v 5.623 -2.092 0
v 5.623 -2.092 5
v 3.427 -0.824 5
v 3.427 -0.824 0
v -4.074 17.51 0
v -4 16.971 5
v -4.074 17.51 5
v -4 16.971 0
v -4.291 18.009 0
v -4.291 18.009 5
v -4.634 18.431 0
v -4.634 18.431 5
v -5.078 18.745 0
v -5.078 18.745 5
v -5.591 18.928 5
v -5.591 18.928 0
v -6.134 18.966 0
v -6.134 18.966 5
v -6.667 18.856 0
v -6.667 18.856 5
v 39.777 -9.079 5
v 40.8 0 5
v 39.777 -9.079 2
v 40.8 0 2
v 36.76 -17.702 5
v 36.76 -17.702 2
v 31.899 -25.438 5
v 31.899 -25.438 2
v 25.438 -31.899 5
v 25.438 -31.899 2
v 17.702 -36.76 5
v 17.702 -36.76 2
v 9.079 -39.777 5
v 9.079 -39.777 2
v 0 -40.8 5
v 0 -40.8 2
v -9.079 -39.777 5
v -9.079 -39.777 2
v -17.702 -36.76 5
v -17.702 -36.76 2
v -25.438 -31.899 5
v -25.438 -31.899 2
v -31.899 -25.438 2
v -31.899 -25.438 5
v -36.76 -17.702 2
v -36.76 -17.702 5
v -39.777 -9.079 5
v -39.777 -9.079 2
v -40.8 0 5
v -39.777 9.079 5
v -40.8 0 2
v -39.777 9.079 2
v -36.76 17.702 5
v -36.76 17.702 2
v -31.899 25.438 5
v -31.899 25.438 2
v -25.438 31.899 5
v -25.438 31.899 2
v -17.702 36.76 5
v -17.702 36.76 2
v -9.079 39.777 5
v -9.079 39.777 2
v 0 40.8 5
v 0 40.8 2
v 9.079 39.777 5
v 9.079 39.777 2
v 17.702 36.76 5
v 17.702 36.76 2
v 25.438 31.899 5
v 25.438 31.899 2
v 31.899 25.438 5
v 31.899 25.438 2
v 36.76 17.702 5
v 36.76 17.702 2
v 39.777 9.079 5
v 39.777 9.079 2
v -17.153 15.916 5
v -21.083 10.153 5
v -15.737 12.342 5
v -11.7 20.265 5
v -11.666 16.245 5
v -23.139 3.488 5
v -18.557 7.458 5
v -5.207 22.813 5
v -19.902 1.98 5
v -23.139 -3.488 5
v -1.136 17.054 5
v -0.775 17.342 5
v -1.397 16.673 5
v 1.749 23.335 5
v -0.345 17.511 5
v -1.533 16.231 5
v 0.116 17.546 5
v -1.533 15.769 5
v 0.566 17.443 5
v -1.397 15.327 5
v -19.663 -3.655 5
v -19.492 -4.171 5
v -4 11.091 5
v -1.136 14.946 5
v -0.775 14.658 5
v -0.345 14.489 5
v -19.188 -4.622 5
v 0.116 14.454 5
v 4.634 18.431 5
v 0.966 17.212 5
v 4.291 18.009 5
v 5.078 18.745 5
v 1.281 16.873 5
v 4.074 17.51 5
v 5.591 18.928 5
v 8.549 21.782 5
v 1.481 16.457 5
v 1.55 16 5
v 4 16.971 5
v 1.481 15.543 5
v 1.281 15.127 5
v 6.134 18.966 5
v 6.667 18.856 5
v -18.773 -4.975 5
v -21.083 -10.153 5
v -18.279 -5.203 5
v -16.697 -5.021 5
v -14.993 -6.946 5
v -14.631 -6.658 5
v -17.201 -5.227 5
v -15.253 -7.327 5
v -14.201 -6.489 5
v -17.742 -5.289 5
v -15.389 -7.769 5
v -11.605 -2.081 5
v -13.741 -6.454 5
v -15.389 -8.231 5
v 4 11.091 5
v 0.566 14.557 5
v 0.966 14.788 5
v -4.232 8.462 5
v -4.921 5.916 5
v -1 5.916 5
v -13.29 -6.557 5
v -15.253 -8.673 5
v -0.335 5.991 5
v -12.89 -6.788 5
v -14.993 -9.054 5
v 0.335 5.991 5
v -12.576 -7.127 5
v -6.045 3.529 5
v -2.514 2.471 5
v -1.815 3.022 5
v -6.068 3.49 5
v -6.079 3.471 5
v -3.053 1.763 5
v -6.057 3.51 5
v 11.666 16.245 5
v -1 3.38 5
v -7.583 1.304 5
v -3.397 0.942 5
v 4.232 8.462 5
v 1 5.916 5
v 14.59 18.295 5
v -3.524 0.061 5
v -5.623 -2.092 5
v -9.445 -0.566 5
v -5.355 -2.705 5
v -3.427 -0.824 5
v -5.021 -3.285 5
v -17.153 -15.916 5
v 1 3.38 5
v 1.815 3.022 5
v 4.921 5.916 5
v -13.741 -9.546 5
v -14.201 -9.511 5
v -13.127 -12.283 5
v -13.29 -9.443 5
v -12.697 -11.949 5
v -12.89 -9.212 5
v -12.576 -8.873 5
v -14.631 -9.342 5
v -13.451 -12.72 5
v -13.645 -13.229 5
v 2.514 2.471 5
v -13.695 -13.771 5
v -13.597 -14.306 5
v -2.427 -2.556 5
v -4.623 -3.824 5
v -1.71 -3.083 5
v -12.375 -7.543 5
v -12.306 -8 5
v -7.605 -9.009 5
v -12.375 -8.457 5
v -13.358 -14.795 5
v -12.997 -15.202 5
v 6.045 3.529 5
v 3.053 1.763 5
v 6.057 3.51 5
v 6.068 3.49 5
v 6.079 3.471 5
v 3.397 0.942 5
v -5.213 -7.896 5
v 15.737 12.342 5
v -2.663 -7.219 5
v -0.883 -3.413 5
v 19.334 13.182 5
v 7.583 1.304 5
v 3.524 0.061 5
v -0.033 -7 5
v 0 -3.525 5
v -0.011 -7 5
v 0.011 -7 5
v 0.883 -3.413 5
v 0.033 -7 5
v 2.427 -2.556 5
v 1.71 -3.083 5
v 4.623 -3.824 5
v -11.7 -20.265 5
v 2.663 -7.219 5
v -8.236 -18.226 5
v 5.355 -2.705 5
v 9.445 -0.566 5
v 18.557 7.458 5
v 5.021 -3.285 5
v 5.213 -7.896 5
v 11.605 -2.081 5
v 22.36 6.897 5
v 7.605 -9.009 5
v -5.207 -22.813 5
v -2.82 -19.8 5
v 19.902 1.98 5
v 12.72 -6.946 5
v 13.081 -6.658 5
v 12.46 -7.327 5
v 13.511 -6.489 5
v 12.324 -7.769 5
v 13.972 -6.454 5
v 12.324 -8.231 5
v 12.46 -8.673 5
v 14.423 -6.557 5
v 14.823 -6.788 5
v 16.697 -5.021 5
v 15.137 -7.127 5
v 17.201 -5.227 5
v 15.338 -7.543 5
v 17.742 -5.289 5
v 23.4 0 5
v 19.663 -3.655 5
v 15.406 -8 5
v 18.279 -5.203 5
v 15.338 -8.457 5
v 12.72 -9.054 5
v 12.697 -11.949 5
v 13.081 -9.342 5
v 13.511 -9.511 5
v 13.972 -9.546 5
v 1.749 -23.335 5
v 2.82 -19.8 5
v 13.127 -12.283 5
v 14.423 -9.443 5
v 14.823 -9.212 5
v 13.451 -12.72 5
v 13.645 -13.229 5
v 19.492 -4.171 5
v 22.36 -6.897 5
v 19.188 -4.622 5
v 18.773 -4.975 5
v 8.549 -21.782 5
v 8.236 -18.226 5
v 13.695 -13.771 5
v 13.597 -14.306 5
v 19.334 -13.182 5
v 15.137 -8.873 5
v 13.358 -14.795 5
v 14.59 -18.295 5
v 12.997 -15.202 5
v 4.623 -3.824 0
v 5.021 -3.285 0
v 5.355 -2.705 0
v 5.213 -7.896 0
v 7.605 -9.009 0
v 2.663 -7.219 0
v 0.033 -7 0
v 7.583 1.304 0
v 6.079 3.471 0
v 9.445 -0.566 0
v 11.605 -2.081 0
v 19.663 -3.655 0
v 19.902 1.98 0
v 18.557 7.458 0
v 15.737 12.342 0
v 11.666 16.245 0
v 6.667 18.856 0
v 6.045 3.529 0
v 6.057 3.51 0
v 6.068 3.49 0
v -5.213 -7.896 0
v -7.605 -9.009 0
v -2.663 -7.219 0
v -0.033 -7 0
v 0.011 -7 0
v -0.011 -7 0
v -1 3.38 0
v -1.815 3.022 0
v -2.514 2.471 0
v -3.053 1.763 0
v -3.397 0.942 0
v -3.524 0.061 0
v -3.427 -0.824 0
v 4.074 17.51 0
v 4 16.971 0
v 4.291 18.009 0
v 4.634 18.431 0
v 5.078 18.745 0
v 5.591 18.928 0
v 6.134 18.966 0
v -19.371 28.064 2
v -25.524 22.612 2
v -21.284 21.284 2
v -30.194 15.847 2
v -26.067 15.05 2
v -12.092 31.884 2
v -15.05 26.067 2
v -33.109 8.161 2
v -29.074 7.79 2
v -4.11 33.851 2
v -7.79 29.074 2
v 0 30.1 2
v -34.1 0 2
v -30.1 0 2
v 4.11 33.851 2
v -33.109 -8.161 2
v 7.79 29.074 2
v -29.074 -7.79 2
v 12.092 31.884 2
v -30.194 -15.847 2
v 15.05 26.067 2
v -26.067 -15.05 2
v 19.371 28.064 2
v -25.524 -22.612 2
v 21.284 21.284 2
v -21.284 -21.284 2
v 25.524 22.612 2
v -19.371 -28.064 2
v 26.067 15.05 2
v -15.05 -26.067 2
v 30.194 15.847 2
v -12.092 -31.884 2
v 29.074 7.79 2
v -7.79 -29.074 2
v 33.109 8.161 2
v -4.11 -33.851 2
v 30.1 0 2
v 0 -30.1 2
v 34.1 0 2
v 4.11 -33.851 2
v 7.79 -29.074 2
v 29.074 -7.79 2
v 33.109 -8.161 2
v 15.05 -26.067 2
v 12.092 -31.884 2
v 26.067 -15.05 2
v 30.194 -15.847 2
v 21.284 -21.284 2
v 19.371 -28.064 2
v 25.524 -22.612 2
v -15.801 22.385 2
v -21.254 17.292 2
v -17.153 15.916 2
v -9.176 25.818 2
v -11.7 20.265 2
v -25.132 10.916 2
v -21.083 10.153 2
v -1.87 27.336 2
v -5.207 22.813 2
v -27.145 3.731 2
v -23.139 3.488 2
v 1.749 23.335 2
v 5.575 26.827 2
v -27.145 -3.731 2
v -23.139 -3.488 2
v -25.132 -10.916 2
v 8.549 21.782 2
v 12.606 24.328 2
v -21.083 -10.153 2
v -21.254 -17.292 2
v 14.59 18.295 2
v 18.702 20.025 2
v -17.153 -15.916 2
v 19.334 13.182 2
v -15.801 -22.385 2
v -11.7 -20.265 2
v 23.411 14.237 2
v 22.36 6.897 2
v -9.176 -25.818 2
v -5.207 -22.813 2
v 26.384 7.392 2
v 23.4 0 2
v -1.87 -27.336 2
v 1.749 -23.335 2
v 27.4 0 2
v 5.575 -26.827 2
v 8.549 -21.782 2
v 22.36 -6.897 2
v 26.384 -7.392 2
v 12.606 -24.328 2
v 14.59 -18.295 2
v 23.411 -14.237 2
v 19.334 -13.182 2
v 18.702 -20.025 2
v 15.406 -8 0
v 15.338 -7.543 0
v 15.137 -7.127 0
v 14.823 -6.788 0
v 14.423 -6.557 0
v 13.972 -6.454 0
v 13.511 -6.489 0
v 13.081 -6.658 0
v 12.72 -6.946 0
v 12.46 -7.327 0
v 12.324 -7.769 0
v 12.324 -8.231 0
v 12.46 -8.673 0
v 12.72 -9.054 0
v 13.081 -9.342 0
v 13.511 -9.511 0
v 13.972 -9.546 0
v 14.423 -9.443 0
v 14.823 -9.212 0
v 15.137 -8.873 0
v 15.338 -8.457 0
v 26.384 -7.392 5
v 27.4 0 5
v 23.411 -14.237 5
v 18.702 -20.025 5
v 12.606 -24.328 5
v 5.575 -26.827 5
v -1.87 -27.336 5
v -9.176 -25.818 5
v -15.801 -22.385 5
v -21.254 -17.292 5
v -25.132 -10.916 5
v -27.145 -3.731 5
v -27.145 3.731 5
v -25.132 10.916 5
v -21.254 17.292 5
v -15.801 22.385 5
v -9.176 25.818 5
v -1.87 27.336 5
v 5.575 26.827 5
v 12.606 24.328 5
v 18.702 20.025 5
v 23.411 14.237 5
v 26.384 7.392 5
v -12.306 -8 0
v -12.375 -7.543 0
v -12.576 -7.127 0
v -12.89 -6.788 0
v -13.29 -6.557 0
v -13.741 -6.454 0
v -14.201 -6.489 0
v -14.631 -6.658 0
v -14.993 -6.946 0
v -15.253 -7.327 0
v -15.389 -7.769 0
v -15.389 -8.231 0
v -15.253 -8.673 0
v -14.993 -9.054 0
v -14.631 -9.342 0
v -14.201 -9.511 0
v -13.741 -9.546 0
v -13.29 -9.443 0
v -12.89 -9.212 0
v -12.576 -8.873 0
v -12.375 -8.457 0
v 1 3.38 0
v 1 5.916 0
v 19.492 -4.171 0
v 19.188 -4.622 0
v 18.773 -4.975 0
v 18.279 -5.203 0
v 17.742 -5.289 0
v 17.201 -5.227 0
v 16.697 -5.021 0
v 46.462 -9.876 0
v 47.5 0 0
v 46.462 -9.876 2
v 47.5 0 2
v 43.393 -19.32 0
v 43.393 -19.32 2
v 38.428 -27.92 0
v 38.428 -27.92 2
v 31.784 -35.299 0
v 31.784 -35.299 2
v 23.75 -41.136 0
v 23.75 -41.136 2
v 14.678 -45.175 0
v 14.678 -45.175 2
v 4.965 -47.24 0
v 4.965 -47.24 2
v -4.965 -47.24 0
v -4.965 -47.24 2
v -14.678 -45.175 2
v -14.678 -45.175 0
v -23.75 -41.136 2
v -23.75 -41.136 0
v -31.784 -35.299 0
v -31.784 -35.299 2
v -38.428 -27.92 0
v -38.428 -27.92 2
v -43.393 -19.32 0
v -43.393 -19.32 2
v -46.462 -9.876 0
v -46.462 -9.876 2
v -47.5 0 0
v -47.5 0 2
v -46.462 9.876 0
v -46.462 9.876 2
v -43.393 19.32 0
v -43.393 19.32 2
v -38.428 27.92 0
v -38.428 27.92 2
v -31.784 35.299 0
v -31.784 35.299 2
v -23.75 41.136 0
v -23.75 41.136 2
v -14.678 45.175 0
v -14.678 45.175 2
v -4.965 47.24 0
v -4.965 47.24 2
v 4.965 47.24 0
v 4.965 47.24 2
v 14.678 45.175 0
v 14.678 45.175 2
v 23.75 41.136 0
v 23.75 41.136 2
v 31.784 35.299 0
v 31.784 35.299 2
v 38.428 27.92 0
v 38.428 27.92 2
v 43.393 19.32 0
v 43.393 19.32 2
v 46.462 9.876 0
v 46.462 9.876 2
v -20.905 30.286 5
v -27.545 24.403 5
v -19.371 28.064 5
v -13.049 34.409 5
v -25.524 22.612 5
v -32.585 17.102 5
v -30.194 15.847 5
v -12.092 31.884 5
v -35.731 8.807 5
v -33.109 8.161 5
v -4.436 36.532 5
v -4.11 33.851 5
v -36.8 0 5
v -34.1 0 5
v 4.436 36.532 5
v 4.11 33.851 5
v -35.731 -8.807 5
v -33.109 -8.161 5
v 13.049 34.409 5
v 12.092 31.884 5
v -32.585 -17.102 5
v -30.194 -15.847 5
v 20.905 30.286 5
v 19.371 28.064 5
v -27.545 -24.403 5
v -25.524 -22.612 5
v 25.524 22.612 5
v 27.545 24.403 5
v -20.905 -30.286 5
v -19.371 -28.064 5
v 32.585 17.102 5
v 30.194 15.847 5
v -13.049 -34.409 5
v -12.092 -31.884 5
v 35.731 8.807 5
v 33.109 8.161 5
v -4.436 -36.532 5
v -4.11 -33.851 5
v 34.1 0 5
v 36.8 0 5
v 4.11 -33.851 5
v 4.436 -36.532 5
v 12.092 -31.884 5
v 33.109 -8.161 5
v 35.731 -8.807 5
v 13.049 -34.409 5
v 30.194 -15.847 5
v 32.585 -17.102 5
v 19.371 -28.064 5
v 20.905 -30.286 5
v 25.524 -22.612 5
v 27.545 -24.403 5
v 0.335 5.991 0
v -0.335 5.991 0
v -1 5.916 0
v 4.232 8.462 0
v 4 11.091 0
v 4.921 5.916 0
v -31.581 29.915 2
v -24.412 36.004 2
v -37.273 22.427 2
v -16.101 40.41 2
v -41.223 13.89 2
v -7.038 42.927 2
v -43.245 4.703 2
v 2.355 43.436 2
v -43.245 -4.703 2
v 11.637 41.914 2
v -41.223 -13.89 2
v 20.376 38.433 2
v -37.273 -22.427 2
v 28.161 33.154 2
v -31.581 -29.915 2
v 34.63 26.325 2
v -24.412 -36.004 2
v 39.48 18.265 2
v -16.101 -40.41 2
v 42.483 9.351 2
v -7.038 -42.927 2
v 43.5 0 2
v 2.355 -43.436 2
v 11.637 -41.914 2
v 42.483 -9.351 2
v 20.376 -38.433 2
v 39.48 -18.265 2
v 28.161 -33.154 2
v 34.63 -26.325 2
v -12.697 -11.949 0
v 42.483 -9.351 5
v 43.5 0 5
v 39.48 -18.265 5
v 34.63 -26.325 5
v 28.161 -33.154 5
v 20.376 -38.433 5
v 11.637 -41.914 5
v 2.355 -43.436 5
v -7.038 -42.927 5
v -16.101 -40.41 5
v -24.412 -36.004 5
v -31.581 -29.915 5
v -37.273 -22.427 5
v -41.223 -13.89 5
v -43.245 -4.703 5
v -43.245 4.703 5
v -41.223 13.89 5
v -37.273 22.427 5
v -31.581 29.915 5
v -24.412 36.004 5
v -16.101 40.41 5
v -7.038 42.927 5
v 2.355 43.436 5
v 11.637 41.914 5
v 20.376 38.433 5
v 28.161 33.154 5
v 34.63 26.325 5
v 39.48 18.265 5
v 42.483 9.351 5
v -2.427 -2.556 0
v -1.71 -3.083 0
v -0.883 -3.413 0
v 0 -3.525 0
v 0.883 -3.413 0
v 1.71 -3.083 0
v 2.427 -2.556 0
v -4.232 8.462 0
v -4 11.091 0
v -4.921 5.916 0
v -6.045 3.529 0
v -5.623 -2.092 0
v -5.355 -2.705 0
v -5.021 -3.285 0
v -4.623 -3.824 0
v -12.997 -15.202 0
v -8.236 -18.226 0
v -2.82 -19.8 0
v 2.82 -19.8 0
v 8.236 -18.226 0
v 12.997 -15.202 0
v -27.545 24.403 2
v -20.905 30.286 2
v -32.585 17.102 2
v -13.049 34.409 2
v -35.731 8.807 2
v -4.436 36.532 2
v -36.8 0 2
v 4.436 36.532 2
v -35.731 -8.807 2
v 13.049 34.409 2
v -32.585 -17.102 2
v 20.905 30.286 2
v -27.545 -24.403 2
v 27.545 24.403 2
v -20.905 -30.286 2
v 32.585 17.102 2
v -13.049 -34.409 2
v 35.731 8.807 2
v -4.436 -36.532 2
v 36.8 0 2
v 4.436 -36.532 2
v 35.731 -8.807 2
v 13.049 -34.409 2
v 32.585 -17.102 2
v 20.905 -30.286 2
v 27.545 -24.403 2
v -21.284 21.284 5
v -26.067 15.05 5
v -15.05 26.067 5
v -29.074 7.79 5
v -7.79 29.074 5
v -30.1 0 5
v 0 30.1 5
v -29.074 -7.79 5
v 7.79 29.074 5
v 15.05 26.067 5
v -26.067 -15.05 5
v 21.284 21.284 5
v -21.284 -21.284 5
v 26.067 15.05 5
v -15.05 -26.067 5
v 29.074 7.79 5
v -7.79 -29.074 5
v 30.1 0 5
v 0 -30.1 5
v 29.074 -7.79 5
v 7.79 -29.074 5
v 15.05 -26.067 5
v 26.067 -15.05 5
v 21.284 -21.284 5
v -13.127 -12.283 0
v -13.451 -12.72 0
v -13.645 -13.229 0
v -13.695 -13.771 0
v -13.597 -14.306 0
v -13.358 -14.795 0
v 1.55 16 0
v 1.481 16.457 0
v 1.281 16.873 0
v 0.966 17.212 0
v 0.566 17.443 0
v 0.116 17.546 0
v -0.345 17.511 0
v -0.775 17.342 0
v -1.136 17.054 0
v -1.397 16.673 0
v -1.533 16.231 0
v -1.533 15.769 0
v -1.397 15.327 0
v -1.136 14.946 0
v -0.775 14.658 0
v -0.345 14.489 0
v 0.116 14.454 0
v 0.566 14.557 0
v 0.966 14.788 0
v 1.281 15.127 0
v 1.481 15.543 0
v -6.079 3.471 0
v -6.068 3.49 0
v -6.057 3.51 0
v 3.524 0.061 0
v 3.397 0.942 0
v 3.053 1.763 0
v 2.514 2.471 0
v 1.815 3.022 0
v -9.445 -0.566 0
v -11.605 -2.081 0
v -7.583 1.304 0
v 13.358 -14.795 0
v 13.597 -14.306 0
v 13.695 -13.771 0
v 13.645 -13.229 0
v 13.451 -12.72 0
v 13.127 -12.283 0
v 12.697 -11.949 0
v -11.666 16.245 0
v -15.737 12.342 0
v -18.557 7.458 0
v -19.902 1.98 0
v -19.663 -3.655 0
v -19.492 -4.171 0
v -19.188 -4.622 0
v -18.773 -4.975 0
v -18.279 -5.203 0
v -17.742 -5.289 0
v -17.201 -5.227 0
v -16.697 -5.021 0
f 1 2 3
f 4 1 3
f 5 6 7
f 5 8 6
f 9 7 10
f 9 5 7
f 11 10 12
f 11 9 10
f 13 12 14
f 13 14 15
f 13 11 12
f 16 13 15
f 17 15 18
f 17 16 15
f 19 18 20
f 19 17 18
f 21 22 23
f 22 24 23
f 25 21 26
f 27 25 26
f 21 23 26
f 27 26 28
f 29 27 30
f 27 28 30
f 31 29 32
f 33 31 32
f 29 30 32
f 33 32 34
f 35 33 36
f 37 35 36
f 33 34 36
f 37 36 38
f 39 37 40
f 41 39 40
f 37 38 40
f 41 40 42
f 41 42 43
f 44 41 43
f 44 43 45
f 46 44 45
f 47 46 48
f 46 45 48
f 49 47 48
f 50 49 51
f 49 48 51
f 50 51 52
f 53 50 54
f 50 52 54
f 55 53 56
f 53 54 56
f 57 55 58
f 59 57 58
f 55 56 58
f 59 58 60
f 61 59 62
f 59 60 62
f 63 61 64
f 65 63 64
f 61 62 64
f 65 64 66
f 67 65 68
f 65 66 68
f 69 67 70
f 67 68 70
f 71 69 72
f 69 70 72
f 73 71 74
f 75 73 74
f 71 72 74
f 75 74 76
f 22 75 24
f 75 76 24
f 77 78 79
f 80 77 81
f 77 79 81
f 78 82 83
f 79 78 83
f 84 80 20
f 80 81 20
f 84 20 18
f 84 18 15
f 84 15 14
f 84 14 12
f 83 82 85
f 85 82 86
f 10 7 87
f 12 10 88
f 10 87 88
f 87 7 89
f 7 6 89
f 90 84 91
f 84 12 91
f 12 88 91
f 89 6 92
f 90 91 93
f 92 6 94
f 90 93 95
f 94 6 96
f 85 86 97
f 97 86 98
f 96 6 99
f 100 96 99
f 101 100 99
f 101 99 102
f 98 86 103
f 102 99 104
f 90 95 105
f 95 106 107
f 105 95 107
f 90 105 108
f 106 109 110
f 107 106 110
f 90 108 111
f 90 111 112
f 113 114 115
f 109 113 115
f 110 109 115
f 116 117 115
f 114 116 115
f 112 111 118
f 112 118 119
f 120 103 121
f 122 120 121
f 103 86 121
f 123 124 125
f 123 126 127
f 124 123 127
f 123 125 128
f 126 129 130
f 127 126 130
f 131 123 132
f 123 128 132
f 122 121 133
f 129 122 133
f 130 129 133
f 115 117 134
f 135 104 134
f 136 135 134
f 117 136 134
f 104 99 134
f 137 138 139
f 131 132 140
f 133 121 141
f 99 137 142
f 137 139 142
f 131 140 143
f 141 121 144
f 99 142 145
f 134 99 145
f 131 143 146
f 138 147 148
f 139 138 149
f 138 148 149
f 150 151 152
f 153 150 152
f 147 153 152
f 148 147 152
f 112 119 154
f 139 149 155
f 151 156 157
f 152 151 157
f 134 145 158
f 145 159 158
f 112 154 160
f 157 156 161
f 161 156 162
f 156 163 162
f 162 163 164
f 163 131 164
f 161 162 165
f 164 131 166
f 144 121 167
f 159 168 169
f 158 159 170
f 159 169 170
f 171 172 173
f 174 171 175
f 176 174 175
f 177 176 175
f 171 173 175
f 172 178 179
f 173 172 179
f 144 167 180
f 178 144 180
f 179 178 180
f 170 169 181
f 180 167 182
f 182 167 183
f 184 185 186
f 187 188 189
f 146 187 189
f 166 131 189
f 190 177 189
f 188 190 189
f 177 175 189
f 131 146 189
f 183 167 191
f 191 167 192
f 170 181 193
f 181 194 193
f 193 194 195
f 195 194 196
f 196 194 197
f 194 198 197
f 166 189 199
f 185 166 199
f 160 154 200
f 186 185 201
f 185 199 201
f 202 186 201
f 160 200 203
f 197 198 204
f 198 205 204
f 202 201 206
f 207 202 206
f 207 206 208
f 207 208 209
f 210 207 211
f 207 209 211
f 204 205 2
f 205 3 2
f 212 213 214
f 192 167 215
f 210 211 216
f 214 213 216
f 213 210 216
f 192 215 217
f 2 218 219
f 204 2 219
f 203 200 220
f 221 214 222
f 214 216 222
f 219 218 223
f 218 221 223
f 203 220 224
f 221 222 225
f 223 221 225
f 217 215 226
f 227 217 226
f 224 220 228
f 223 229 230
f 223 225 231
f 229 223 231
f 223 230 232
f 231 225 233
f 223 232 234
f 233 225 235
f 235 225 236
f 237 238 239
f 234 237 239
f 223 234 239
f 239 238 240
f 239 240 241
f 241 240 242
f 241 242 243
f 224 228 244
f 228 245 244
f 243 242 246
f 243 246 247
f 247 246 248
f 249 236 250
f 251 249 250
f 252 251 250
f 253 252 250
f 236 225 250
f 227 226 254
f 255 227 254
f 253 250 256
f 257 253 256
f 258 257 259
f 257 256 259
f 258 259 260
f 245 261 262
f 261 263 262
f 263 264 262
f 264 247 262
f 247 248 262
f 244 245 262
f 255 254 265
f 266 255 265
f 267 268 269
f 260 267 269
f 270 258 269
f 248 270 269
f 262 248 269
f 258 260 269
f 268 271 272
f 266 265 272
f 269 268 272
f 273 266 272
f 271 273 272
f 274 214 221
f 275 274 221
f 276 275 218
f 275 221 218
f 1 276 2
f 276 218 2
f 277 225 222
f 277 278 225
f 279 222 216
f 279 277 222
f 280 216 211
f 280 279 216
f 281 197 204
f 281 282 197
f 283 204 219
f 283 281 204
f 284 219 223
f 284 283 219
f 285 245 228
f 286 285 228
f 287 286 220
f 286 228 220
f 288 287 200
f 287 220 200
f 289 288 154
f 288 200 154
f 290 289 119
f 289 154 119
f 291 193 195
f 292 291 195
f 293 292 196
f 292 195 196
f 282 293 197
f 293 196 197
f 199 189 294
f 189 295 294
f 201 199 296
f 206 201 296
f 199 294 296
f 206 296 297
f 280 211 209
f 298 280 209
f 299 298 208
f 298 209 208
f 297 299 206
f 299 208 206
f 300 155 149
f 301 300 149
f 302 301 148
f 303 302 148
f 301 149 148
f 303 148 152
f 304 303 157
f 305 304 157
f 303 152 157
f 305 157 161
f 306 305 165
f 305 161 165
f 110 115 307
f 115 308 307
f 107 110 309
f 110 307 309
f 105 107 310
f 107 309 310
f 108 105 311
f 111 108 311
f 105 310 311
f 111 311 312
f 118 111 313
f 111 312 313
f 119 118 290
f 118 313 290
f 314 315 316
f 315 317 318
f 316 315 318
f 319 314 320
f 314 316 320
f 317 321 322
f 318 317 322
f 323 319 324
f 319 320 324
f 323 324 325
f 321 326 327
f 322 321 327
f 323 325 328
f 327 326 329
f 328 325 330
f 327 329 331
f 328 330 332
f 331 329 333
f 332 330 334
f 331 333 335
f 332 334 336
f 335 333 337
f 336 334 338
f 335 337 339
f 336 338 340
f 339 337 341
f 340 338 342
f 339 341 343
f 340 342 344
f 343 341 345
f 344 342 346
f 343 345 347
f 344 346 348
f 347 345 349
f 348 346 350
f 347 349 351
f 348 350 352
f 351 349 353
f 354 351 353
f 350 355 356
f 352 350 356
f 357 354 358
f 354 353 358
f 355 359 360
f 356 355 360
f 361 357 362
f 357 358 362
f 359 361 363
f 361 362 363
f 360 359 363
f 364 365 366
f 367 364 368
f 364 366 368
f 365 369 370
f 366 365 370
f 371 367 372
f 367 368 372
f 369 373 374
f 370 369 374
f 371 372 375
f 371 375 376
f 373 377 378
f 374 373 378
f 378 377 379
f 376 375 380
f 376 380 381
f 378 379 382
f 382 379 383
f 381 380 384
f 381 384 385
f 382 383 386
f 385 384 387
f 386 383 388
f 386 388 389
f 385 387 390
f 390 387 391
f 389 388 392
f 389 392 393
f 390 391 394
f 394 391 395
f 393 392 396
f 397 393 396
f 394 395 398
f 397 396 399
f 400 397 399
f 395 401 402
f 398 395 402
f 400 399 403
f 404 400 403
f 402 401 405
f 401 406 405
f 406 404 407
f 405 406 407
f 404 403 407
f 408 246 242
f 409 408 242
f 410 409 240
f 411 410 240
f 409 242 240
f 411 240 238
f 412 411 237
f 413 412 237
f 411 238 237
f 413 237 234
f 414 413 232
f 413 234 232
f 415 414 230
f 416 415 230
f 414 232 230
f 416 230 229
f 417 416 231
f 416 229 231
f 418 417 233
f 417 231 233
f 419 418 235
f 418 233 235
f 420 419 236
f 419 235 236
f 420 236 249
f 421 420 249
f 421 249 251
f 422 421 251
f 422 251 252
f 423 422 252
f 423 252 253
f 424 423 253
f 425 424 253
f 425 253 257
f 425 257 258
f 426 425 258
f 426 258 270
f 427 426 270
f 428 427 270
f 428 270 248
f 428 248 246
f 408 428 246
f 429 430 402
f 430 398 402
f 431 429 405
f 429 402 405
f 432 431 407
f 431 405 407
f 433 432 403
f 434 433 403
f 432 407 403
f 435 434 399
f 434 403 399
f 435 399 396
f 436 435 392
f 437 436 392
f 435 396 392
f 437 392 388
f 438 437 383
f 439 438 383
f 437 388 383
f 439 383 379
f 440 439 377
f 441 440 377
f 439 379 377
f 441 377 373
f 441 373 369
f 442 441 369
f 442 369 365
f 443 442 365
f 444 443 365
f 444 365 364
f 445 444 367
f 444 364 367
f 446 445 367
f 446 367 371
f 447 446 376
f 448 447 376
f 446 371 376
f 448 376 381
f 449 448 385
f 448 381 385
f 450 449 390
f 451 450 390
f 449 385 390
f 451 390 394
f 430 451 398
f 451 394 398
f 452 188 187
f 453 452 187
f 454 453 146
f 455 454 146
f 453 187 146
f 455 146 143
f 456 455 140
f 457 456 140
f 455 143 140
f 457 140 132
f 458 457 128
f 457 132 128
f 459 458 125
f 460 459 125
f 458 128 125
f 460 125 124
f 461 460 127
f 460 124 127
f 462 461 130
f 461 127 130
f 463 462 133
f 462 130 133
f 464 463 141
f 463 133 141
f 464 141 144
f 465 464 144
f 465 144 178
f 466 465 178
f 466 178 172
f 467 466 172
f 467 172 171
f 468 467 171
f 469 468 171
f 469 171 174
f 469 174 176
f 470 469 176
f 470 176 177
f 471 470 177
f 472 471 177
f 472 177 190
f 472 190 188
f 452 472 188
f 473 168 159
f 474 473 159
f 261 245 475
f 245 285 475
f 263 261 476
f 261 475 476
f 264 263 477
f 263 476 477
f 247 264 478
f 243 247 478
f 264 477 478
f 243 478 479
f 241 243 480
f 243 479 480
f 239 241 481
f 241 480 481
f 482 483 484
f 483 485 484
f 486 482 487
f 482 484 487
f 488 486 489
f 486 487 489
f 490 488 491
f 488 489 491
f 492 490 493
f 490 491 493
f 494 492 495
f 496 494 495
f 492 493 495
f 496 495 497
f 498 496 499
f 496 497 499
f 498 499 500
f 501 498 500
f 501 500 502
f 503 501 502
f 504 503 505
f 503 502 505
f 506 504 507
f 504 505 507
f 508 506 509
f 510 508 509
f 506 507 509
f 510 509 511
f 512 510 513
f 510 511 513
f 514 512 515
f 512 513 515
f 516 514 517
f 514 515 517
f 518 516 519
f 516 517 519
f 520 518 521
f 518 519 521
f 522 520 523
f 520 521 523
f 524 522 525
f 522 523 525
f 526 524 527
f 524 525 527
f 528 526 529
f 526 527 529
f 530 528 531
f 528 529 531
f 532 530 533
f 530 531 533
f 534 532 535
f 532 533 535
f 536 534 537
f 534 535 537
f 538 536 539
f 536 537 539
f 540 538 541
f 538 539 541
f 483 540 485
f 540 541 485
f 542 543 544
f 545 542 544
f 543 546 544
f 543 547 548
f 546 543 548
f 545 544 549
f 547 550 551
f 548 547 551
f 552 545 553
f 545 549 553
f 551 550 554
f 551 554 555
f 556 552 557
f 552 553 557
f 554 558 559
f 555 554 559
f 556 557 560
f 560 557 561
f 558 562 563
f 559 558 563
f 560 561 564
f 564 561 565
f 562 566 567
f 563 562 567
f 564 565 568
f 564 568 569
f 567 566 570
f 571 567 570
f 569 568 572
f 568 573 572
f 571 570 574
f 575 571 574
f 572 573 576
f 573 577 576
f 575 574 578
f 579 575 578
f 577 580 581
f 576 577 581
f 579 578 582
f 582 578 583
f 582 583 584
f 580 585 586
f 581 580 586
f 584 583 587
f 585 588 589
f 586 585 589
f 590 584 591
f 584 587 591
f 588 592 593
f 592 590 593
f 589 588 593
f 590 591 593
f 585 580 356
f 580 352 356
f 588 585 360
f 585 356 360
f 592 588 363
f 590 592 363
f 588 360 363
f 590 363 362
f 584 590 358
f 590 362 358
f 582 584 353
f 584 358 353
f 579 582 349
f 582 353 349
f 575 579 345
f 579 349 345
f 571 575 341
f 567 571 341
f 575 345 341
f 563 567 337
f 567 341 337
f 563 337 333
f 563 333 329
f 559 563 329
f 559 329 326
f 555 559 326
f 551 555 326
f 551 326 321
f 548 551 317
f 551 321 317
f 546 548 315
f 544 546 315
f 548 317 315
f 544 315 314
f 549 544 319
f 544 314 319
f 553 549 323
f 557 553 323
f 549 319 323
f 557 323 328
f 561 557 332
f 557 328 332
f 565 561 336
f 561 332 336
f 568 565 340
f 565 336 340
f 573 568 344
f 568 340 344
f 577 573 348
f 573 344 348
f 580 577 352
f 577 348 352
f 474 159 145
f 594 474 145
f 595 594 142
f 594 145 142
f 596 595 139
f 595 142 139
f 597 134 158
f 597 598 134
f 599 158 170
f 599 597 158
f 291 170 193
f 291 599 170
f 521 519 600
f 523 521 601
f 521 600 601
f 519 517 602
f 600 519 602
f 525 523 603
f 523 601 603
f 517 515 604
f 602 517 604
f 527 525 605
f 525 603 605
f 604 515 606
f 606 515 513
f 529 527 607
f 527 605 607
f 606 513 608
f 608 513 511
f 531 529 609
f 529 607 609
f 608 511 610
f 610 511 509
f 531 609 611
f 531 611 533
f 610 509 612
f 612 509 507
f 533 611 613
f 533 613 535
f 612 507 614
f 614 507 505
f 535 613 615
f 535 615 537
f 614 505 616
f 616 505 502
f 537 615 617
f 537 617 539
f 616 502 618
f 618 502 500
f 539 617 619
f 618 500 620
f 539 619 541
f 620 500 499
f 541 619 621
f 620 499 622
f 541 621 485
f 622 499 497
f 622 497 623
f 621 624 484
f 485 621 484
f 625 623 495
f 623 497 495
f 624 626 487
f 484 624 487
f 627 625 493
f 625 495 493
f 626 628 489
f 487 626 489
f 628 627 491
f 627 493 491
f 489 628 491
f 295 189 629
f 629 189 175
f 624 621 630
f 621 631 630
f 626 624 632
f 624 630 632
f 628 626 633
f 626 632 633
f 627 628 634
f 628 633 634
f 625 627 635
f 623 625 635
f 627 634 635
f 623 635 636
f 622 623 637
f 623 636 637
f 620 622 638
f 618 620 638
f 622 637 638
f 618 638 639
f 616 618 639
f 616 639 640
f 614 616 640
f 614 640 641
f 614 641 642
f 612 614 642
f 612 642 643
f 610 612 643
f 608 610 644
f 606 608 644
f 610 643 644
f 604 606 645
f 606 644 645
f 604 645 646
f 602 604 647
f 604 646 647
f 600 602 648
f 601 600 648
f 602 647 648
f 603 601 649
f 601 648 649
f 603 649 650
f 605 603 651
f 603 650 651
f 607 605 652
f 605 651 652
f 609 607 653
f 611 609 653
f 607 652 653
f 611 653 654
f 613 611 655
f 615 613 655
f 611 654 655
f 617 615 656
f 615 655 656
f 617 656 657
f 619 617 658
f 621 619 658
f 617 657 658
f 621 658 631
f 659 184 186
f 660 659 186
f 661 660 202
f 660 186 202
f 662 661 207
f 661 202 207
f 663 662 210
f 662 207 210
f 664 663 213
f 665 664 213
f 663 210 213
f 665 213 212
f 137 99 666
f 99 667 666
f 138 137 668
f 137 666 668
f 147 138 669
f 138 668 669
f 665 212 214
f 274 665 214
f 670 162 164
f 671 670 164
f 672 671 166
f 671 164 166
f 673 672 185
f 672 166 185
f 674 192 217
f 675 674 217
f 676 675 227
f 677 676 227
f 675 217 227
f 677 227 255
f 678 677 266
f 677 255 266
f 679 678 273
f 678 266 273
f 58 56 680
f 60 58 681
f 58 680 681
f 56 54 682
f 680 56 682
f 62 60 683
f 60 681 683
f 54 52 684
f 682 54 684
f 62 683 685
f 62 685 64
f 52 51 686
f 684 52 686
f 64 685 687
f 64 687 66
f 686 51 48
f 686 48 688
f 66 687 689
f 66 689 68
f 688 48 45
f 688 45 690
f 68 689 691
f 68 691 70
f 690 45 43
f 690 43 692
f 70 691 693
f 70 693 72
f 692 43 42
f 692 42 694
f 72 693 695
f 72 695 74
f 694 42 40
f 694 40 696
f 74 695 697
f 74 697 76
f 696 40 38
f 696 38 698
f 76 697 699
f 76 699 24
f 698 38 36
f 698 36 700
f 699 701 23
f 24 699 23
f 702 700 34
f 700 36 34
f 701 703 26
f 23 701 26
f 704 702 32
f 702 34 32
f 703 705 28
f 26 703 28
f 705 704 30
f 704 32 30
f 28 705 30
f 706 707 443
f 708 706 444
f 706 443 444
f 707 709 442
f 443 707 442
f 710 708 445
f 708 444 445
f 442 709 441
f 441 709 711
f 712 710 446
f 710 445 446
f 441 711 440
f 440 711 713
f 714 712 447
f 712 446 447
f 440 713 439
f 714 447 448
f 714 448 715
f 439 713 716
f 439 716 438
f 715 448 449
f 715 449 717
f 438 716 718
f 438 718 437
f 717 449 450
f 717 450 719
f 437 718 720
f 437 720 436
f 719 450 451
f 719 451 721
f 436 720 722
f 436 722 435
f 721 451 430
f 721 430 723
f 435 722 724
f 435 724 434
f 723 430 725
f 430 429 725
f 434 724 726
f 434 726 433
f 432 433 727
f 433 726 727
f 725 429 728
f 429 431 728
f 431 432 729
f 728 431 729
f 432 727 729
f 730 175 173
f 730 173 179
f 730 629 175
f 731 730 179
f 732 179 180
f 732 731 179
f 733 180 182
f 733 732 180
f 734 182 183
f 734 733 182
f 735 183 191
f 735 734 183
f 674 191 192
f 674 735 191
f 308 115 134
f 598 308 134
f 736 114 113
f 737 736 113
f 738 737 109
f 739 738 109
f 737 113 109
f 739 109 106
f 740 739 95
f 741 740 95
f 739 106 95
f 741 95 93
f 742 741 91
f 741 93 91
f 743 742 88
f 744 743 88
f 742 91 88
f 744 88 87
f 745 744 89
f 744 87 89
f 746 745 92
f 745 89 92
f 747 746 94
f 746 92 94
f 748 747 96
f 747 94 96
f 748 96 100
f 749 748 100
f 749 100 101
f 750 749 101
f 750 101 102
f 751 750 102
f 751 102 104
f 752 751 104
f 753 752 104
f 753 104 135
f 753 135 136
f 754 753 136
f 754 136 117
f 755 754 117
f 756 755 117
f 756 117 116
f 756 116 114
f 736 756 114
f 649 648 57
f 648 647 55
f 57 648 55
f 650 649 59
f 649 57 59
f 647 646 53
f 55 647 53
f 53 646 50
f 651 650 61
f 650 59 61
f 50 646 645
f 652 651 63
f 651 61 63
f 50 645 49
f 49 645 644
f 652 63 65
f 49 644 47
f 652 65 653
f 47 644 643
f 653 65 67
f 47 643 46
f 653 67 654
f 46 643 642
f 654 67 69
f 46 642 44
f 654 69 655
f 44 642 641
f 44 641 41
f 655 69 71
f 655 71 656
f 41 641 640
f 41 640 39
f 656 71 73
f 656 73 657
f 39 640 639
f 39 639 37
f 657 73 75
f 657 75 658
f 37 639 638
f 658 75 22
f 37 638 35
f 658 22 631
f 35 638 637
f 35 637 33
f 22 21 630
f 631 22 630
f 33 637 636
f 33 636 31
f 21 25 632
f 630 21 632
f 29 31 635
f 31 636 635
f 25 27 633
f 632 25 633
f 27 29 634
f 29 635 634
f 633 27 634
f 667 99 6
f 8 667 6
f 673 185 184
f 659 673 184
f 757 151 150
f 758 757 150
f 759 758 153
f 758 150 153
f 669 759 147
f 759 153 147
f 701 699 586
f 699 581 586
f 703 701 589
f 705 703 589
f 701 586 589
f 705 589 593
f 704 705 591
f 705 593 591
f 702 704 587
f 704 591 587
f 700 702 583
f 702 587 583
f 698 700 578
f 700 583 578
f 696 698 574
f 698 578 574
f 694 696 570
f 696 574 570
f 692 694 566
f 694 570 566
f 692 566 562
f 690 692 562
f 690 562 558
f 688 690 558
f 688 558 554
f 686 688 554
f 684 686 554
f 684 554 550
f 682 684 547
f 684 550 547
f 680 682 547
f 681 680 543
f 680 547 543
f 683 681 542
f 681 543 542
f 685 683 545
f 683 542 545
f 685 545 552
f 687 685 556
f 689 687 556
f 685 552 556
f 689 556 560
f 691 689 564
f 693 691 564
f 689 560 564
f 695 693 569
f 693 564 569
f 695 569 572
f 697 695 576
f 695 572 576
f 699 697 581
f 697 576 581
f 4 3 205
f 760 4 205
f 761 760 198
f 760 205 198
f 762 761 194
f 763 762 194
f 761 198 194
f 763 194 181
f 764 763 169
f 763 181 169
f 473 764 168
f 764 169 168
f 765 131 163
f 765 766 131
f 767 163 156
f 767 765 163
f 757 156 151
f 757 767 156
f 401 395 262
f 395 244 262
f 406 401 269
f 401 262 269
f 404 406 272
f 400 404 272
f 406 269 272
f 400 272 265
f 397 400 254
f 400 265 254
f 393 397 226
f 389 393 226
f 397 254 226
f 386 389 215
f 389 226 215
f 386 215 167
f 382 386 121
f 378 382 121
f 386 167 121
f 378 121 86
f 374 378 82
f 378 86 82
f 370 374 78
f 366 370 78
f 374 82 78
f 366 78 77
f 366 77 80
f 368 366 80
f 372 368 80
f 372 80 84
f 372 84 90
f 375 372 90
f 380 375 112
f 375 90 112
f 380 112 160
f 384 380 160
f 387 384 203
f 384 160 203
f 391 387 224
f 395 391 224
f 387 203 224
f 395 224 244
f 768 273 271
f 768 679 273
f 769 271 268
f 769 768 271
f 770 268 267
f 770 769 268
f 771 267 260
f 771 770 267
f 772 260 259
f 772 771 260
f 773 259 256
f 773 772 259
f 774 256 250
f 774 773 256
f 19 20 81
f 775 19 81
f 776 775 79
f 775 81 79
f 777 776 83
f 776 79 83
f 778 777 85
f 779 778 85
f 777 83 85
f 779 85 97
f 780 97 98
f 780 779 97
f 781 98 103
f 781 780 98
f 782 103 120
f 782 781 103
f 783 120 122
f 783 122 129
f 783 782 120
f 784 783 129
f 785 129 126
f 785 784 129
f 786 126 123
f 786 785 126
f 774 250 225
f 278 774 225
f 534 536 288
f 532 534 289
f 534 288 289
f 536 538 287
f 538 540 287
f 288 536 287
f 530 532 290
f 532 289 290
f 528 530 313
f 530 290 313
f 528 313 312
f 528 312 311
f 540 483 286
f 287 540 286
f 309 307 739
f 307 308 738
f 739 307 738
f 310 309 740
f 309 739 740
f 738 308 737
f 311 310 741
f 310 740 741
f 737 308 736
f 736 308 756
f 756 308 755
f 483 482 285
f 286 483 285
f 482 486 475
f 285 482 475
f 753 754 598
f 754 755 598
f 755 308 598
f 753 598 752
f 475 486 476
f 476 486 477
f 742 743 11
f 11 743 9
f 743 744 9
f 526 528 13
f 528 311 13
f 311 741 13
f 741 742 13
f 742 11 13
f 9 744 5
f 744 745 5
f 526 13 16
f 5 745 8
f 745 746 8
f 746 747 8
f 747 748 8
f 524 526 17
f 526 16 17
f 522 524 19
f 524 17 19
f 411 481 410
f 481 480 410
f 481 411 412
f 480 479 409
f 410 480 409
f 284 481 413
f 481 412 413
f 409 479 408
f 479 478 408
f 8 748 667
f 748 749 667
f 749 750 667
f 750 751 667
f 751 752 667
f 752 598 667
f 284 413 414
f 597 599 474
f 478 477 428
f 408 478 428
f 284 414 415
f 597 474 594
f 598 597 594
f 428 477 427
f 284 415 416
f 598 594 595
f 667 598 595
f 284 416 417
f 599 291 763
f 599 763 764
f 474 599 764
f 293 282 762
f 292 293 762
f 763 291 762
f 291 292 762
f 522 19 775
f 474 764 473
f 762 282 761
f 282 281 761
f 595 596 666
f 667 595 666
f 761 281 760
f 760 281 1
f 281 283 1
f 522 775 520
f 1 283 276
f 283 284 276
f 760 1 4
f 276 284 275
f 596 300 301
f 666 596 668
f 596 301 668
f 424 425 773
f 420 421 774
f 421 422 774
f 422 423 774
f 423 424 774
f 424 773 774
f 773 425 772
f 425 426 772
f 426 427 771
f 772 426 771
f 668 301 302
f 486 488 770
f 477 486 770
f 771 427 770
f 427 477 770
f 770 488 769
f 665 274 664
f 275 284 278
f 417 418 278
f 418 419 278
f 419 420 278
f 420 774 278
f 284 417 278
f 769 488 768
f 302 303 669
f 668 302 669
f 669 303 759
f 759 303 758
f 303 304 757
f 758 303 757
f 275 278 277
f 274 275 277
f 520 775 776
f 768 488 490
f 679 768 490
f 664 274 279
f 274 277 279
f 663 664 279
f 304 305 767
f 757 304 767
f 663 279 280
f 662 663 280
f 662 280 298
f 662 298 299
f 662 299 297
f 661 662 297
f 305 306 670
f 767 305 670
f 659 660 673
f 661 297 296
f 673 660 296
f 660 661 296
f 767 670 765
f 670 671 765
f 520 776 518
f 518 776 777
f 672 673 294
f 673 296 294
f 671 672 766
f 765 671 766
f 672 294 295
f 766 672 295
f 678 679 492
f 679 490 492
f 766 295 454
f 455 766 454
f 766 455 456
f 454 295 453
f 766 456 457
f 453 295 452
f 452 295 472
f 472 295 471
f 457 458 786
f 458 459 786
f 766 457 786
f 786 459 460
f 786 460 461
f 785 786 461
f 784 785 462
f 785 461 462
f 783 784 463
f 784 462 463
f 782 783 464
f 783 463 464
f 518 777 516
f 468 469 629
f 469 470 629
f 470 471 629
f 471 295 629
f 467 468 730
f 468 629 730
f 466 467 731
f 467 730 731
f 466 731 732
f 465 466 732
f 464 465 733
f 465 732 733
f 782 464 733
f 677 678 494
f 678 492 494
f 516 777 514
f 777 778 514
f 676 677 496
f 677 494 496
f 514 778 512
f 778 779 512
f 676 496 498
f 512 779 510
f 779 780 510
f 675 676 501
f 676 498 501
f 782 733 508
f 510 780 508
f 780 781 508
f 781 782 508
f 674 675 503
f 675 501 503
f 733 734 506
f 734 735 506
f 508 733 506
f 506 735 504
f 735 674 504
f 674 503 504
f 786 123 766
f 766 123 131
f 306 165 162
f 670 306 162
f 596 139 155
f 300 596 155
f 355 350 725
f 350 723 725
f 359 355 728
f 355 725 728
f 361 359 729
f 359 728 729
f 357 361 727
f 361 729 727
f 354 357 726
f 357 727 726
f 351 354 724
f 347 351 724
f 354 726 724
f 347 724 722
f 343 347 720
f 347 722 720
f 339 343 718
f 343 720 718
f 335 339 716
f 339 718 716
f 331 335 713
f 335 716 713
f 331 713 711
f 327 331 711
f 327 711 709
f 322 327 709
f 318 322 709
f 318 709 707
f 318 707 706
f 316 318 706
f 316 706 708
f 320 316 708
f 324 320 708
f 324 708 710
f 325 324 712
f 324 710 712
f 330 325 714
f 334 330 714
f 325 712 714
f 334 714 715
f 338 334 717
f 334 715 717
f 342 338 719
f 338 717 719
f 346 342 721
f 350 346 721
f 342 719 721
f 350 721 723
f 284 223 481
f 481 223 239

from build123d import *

# Parameters (mm, degrees)
F2_R     = 1.55
F3_DEPTH = 5.001
F4_R     = 15
F5_R     = 2


with BuildPart() as f1:
    # F0 (on Front) → F1 (revolve)
    with BuildSketch(Plane.XZ):
        Polygon((0, 0), (47.5, 0), (47.5, 2), (43.5, 2), (43.5, 5), (40.8, 5), (40.8, 2), (36.8, 2), (36.8, 5), (34.1, 5), (34.1, 2), (30.1, 2), (30.1, 5), (27.4, 5), (27.4, 2), (23.4, 2), (23.4, 5), (0, 5), align=None)
    revolve(axis=Axis((0, 0, 0.333373), (0, 0, -1)))

    # F2 (on face) → F3 (cut, through all)
    with BuildSketch(Plane.XY.offset(5)):
        with BuildLine():
            ThreePointArc((3.427323, -0.824065), (3.05274, 1.7625), (1, 3.380181))
            Line((1, 3.380181), (1, 5.91608))
            ThreePointArc((1, 5.91608), (0, 6), (-1, 5.91608))
            Line((-1, 5.91608), (-1, 3.380181))
            ThreePointArc((-1, 3.380181), (-3.05274, 1.7625), (-3.427323, -0.824065))
            Line((-3.427323, -0.824065), (-5.623475, -2.092014))
            ThreePointArc((-5.623475, -2.092014), (-5.196152, -3), (-4.623475, -3.824065))
            Line((-4.623475, -3.824065), (-2.427323, -2.556116))
            ThreePointArc((-2.427323, -2.556116), (0, -3.525), (2.427323, -2.556116))
            Line((2.427323, -2.556116), (4.623475, -3.824065))
            ThreePointArc((4.623475, -3.824065), (5.196152, -3), (5.623475, -2.092014))
            Line((5.623475, -2.092014), (3.427323, -0.824065))
        make_face()
        with BuildLine():
            ThreePointArc((-6.974937, 0.59182), (-6.062178, 3.5), (-4, 5.744563))
            Line((-4, 5.744563), (-4, 19.595918))
            ThreePointArc((-4, 19.595918), (-17.320508, 10), (-18.970563, -6.333857))
            Line((-18.970563, -6.333857), (-6.974937, 0.59182))
        make_face()
        with BuildLine():
            Line((4, 19.595918), (4, 5.744563))
            ThreePointArc((4, 5.744563), (6.062178, 3.5), (6.974937, 0.59182))
            Line((6.974937, 0.59182), (18.970563, -6.333857))
            ThreePointArc((18.970563, -6.333857), (17.320508, 10), (4, 19.595918))
        make_face()
        with Locations((0, 16)):
            Circle(F2_R)
        with BuildLine():
            ThreePointArc((2.974937, -6.336383), (0, -7), (-2.974937, -6.336383))
            Line((-2.974937, -6.336383), (-14.970563, -13.262061))
            ThreePointArc((-14.970563, -13.262061), (0, -20), (14.970563, -13.262061))
            Line((14.970563, -13.262061), (2.974937, -6.336383))
        make_face()
        with Locations((-13.856406, -8)):
            Circle(F2_R)
        with Locations((13.856406, -8)):
            Circle(F2_R)
    extrude(amount=-F3_DEPTH, mode=Mode.SUBTRACT)

    # F4
    f4_edges = [f1.edges().sort_by_distance(p)[0] for p in [
        (4, 5.744563, 2.5),
        (6.974937, 0.59182, 2.5),
        (-2.974937, -6.336383, 2.5),
        (2.974937, -6.336383, 2.5),
        (-4, 5.744563, 2.5),
        (-6.974937, 0.59182, 2.5),
    ]]
    fillet(f4_edges, radius=F4_R)

    # F5
    f5_edges = [f1.edges().sort_by_distance(p)[0] for p in [
        (-4, 19.595918, 2.5),
        (4, 19.595918, 2.5),
        (-18.970563, -6.333857, 2.5),
        (-14.970563, -13.262061, 2.5),
        (14.970563, -13.262061, 2.5),
        (18.970563, -6.333857, 2.5),
    ]]
    fillet(f5_edges, radius=F5_R)


solid = f1.part
